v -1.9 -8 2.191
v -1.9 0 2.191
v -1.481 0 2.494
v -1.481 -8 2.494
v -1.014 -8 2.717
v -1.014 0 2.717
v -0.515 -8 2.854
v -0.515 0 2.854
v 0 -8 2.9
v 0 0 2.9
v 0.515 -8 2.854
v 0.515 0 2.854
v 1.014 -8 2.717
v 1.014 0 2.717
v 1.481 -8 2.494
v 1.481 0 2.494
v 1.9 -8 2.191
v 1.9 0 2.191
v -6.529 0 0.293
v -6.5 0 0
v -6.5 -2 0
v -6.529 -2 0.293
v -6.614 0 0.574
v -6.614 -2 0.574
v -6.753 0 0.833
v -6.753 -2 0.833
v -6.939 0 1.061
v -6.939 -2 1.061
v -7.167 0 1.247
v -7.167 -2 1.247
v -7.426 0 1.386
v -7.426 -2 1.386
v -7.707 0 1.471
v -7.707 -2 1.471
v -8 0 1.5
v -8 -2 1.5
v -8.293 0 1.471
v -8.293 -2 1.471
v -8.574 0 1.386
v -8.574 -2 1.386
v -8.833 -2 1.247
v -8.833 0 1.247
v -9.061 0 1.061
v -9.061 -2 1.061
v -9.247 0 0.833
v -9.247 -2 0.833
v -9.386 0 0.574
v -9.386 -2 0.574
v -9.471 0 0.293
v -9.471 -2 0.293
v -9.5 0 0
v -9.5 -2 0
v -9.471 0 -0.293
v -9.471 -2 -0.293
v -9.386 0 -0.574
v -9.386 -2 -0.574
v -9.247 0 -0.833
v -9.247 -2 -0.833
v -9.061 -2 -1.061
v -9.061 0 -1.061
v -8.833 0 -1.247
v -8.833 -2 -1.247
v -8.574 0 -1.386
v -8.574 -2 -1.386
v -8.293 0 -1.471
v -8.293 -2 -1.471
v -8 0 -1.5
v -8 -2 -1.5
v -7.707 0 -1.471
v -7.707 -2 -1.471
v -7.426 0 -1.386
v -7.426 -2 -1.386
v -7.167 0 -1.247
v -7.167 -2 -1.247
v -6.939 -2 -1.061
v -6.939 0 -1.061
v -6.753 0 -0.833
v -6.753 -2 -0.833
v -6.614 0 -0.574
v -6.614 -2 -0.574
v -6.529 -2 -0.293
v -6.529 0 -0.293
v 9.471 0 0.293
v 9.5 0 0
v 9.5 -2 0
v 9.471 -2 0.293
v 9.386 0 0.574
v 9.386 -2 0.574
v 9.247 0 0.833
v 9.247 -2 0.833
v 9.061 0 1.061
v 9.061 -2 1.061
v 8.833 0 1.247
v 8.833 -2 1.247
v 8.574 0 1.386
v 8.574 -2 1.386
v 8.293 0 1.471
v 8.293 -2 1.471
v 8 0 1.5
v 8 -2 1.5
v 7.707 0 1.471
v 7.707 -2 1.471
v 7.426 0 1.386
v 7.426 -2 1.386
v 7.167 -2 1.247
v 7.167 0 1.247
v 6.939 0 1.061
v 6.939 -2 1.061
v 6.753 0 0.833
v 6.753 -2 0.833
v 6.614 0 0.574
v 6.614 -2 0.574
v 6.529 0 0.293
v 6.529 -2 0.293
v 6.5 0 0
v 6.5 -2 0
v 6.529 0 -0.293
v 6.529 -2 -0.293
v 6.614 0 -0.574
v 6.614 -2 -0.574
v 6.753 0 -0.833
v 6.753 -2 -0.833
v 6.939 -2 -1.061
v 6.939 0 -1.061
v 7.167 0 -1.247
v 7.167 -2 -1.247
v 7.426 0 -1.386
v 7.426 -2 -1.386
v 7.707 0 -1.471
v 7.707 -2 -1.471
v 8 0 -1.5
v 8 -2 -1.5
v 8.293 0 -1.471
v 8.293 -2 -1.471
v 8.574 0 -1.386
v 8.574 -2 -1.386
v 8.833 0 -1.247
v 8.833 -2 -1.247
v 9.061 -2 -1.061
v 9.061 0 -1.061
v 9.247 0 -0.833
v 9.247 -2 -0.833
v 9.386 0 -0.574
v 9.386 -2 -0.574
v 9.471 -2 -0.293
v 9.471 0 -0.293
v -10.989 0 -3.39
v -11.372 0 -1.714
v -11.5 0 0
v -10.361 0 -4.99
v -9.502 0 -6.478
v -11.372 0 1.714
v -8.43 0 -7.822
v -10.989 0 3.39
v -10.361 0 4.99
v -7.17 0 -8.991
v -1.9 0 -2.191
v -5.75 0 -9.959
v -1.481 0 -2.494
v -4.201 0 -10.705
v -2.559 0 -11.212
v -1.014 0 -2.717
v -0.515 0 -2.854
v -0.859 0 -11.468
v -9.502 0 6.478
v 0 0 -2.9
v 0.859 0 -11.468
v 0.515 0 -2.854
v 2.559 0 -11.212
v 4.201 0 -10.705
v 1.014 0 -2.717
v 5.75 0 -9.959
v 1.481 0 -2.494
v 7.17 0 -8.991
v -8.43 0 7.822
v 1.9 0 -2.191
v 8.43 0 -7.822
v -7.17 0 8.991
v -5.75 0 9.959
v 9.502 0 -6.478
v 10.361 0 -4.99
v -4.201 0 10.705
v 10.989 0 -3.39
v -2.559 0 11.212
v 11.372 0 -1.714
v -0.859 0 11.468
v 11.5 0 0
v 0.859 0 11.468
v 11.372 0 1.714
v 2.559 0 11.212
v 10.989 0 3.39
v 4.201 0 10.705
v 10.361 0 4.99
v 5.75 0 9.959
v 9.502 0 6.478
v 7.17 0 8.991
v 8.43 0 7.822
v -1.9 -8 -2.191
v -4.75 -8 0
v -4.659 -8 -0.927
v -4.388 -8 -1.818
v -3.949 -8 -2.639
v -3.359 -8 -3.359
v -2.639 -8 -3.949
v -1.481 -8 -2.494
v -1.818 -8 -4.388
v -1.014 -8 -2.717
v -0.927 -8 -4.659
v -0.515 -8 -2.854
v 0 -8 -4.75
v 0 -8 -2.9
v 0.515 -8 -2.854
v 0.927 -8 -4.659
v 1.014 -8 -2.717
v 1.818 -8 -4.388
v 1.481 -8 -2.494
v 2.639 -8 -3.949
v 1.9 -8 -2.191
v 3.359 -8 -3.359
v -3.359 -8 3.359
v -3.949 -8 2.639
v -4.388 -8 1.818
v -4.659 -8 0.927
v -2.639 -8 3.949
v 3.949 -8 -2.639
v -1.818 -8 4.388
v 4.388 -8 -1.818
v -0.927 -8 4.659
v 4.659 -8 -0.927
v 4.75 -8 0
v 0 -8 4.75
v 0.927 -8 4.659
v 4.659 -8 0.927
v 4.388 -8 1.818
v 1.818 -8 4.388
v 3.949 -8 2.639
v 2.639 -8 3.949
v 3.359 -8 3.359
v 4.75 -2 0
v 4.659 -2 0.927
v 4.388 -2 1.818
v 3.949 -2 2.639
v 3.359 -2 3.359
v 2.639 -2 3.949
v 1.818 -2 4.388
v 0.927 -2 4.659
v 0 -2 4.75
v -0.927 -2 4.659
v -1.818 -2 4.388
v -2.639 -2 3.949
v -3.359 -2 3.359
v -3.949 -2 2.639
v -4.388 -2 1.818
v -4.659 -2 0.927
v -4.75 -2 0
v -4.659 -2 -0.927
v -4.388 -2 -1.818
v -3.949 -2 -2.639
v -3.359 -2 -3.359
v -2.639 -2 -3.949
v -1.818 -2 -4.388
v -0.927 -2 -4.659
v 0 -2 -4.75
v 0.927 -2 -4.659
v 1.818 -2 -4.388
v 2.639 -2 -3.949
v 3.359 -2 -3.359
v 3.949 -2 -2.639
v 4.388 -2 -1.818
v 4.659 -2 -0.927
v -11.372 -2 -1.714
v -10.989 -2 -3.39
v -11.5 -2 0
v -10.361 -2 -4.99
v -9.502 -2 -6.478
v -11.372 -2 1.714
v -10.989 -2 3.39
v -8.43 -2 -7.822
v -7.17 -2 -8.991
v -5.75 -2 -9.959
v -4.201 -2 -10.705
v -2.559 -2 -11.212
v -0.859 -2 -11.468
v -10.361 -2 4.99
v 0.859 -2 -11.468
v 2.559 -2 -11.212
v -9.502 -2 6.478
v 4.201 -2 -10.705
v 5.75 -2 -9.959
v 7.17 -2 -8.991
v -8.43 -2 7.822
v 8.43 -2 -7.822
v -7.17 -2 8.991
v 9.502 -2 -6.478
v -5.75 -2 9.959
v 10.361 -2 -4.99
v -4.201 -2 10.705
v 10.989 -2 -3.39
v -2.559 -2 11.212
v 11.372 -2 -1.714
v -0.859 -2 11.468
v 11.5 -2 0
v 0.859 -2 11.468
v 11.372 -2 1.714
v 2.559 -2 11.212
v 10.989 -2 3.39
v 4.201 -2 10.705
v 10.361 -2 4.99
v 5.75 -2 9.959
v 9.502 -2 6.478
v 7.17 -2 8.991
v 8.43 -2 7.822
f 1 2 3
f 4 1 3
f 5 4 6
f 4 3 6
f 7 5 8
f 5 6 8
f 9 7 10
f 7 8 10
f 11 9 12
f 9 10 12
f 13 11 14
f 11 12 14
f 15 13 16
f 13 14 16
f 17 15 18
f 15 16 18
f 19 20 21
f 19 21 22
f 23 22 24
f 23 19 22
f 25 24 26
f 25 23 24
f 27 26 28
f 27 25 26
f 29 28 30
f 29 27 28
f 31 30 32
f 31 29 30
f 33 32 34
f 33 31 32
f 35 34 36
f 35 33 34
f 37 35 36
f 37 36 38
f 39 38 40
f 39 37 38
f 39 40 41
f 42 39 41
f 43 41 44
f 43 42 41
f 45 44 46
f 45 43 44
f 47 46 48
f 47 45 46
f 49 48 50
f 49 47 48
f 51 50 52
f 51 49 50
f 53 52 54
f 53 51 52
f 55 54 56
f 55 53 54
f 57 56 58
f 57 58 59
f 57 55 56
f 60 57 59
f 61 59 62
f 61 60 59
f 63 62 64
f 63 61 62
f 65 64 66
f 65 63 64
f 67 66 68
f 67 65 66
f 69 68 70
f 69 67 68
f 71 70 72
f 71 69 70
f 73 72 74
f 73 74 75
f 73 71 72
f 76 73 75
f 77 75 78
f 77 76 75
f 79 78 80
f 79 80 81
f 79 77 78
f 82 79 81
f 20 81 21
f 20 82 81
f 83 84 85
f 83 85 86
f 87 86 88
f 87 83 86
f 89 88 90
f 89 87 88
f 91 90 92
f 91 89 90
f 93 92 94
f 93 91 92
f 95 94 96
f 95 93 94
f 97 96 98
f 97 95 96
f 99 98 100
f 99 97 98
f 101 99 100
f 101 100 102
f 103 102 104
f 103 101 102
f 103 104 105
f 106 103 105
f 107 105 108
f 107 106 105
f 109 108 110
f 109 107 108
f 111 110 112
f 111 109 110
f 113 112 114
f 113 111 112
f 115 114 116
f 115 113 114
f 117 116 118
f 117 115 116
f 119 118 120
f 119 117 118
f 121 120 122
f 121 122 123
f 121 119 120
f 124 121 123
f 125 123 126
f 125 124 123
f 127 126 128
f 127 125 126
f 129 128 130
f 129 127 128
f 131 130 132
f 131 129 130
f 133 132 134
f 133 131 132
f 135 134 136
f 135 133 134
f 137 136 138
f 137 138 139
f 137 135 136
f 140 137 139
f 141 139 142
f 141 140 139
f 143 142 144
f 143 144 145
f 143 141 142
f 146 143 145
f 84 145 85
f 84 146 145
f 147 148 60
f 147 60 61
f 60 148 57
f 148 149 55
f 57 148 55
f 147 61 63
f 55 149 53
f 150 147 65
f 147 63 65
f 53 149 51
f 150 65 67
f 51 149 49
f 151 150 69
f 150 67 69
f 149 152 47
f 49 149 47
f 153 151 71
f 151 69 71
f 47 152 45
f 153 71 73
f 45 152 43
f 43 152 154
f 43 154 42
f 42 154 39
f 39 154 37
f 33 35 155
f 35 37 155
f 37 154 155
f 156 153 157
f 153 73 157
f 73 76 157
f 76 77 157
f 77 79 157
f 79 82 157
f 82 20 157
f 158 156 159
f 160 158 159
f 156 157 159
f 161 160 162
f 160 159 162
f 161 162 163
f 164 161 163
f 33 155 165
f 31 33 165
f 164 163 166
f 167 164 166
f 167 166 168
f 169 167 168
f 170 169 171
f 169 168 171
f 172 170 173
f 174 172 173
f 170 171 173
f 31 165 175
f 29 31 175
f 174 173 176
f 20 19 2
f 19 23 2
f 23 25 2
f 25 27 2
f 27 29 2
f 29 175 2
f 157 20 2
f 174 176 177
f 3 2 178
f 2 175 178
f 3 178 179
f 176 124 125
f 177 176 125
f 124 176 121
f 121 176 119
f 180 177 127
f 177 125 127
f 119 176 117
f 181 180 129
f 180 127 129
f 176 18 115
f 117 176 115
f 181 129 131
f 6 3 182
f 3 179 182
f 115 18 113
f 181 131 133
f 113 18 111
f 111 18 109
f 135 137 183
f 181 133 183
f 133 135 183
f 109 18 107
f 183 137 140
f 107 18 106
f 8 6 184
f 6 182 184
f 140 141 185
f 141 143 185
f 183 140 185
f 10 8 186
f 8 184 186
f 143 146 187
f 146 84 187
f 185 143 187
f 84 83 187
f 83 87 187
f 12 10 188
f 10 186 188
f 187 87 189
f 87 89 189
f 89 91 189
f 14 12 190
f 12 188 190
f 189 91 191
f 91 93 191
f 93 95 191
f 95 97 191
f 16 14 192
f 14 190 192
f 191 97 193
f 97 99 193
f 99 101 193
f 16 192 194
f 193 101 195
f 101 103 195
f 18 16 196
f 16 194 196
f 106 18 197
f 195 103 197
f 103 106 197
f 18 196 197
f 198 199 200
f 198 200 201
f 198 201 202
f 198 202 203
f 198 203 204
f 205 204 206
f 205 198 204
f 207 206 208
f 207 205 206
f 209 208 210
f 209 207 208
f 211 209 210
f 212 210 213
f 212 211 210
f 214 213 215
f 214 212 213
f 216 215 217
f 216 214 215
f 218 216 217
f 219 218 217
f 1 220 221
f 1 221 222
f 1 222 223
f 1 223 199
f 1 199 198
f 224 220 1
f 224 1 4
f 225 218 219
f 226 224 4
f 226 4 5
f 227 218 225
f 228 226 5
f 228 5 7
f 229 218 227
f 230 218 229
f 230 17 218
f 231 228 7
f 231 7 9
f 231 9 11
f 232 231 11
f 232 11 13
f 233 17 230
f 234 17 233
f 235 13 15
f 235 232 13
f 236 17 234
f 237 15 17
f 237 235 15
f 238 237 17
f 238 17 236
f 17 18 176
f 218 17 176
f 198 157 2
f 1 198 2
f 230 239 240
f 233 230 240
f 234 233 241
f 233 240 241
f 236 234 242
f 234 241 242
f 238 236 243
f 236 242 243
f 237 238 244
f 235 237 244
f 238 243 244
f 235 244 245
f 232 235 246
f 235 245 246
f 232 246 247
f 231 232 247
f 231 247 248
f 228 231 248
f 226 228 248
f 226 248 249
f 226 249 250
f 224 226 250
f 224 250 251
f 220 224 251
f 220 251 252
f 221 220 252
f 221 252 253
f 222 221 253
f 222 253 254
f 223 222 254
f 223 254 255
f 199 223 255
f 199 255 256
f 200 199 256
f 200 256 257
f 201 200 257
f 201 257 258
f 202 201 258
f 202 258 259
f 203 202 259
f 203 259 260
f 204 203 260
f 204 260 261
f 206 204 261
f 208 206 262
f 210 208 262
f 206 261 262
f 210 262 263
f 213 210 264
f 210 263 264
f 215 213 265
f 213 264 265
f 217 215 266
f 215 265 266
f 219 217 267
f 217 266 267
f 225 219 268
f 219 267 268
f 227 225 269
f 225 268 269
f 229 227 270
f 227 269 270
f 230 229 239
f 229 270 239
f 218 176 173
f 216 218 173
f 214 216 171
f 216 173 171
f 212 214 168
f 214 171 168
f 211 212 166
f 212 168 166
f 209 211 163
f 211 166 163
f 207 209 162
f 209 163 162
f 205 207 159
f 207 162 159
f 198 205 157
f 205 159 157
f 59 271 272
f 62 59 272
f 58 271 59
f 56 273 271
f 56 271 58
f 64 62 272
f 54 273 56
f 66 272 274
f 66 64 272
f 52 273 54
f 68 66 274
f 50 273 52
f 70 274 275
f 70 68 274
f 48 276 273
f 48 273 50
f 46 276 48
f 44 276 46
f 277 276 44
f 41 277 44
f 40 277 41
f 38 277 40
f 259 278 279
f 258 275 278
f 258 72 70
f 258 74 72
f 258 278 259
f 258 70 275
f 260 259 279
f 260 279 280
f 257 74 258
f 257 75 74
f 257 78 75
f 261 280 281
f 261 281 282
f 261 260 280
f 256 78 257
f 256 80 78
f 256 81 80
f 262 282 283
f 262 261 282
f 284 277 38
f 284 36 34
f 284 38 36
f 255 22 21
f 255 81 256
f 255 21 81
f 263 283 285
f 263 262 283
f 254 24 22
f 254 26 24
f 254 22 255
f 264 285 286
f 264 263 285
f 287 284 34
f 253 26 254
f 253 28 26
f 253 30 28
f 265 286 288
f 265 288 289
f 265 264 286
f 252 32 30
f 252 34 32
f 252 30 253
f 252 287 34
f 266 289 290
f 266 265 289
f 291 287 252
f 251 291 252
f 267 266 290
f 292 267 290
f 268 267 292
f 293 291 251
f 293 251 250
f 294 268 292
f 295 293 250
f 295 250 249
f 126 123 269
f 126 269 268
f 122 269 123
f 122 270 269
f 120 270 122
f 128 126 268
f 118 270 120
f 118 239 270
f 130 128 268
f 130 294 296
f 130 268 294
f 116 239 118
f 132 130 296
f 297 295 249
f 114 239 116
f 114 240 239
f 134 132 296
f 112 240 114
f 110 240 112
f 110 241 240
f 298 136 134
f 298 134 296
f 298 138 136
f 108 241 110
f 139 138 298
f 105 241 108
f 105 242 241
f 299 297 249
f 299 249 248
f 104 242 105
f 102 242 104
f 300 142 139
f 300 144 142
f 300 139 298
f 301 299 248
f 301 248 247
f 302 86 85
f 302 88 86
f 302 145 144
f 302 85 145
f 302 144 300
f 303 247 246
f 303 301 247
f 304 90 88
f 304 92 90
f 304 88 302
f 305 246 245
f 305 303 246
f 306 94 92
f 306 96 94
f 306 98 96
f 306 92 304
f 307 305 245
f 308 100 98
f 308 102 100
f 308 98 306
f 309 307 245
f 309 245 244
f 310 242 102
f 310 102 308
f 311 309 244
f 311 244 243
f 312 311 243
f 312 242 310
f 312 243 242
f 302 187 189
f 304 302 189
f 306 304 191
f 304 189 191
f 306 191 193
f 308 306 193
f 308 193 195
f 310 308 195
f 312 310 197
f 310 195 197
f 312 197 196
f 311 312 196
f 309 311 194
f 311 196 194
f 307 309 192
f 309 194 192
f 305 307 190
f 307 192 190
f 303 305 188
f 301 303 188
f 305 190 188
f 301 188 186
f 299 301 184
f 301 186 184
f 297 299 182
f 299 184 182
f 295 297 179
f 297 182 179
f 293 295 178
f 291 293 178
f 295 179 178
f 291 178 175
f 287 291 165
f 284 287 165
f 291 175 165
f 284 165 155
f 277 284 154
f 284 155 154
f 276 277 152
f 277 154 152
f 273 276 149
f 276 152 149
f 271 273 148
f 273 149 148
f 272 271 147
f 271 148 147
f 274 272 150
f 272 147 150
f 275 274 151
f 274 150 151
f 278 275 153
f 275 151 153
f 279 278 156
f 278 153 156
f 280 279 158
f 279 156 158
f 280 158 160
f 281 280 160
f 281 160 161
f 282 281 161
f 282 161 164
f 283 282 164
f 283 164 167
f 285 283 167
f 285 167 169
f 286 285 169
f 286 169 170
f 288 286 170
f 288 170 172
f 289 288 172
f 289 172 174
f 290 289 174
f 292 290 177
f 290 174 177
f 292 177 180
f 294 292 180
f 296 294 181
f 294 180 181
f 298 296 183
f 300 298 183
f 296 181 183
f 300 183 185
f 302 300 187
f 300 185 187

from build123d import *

# Parameters (mm, degrees)
F0_R     = 4.75
F1_DEPTH = 8
F0_R_2   = 11.5
F0_R_3   = 1.5
F2_DEPTH = 2


# Not quite as in the source:
# - a feature names something its author has since deleted; it is built from what else it names


with BuildPart() as f1:
    # F0 (on Front) → F1 (new body)
    with BuildSketch(Plane.XZ):
        Circle(F0_R)
        with BuildLine():
            ThreePointArc((1.9, 2.19089023), (2.6381811917, 1.2041594579), (2.9, 0))
            ThreePointArc((2.9, 0), (2.6381811917, -1.2041594579), (1.9, -2.19089023))
            ThreePointArc((1.9, -2.19089023), (0, -2.9), (-1.9, -2.19089023))
            ThreePointArc((-1.9, -2.19089023), (-2.9, 0), (-1.9, 2.19089023))
            ThreePointArc((-1.9, 2.19089023), (0, 2.9), (1.9, 2.19089023))
        make_face(mode=Mode.SUBTRACT)
        with BuildLine():
            Line((-1.9, -2.19089023), (-1.9, 2.19089023))
            ThreePointArc((-1.9, 2.19089023), (-2.9, 0), (-1.9, -2.19089023))
        make_face()
        with BuildLine():
            ThreePointArc((1.9, -2.19089023), (2.6381811917, -1.2041594579), (2.9, 0))
            ThreePointArc((2.9, 0), (2.6381811917, 1.2041594579), (1.9, 2.19089023))
            Line((1.9, 2.19089023), (1.9, -2.19089023))
        make_face()
    extrude(amount=F1_DEPTH)

    # F0 (on Front) → F2 (join)
    with BuildSketch(Plane.XZ):
        Circle(F0_R_2)
        with Locations((-8, 0)):
            Circle(F0_R_3, mode=Mode.SUBTRACT)
        Circle(F0_R, mode=Mode.SUBTRACT)
        with Locations((8, 0)):
            Circle(F0_R_3, mode=Mode.SUBTRACT)
    extrude(amount=F2_DEPTH)


solid = f1.part
